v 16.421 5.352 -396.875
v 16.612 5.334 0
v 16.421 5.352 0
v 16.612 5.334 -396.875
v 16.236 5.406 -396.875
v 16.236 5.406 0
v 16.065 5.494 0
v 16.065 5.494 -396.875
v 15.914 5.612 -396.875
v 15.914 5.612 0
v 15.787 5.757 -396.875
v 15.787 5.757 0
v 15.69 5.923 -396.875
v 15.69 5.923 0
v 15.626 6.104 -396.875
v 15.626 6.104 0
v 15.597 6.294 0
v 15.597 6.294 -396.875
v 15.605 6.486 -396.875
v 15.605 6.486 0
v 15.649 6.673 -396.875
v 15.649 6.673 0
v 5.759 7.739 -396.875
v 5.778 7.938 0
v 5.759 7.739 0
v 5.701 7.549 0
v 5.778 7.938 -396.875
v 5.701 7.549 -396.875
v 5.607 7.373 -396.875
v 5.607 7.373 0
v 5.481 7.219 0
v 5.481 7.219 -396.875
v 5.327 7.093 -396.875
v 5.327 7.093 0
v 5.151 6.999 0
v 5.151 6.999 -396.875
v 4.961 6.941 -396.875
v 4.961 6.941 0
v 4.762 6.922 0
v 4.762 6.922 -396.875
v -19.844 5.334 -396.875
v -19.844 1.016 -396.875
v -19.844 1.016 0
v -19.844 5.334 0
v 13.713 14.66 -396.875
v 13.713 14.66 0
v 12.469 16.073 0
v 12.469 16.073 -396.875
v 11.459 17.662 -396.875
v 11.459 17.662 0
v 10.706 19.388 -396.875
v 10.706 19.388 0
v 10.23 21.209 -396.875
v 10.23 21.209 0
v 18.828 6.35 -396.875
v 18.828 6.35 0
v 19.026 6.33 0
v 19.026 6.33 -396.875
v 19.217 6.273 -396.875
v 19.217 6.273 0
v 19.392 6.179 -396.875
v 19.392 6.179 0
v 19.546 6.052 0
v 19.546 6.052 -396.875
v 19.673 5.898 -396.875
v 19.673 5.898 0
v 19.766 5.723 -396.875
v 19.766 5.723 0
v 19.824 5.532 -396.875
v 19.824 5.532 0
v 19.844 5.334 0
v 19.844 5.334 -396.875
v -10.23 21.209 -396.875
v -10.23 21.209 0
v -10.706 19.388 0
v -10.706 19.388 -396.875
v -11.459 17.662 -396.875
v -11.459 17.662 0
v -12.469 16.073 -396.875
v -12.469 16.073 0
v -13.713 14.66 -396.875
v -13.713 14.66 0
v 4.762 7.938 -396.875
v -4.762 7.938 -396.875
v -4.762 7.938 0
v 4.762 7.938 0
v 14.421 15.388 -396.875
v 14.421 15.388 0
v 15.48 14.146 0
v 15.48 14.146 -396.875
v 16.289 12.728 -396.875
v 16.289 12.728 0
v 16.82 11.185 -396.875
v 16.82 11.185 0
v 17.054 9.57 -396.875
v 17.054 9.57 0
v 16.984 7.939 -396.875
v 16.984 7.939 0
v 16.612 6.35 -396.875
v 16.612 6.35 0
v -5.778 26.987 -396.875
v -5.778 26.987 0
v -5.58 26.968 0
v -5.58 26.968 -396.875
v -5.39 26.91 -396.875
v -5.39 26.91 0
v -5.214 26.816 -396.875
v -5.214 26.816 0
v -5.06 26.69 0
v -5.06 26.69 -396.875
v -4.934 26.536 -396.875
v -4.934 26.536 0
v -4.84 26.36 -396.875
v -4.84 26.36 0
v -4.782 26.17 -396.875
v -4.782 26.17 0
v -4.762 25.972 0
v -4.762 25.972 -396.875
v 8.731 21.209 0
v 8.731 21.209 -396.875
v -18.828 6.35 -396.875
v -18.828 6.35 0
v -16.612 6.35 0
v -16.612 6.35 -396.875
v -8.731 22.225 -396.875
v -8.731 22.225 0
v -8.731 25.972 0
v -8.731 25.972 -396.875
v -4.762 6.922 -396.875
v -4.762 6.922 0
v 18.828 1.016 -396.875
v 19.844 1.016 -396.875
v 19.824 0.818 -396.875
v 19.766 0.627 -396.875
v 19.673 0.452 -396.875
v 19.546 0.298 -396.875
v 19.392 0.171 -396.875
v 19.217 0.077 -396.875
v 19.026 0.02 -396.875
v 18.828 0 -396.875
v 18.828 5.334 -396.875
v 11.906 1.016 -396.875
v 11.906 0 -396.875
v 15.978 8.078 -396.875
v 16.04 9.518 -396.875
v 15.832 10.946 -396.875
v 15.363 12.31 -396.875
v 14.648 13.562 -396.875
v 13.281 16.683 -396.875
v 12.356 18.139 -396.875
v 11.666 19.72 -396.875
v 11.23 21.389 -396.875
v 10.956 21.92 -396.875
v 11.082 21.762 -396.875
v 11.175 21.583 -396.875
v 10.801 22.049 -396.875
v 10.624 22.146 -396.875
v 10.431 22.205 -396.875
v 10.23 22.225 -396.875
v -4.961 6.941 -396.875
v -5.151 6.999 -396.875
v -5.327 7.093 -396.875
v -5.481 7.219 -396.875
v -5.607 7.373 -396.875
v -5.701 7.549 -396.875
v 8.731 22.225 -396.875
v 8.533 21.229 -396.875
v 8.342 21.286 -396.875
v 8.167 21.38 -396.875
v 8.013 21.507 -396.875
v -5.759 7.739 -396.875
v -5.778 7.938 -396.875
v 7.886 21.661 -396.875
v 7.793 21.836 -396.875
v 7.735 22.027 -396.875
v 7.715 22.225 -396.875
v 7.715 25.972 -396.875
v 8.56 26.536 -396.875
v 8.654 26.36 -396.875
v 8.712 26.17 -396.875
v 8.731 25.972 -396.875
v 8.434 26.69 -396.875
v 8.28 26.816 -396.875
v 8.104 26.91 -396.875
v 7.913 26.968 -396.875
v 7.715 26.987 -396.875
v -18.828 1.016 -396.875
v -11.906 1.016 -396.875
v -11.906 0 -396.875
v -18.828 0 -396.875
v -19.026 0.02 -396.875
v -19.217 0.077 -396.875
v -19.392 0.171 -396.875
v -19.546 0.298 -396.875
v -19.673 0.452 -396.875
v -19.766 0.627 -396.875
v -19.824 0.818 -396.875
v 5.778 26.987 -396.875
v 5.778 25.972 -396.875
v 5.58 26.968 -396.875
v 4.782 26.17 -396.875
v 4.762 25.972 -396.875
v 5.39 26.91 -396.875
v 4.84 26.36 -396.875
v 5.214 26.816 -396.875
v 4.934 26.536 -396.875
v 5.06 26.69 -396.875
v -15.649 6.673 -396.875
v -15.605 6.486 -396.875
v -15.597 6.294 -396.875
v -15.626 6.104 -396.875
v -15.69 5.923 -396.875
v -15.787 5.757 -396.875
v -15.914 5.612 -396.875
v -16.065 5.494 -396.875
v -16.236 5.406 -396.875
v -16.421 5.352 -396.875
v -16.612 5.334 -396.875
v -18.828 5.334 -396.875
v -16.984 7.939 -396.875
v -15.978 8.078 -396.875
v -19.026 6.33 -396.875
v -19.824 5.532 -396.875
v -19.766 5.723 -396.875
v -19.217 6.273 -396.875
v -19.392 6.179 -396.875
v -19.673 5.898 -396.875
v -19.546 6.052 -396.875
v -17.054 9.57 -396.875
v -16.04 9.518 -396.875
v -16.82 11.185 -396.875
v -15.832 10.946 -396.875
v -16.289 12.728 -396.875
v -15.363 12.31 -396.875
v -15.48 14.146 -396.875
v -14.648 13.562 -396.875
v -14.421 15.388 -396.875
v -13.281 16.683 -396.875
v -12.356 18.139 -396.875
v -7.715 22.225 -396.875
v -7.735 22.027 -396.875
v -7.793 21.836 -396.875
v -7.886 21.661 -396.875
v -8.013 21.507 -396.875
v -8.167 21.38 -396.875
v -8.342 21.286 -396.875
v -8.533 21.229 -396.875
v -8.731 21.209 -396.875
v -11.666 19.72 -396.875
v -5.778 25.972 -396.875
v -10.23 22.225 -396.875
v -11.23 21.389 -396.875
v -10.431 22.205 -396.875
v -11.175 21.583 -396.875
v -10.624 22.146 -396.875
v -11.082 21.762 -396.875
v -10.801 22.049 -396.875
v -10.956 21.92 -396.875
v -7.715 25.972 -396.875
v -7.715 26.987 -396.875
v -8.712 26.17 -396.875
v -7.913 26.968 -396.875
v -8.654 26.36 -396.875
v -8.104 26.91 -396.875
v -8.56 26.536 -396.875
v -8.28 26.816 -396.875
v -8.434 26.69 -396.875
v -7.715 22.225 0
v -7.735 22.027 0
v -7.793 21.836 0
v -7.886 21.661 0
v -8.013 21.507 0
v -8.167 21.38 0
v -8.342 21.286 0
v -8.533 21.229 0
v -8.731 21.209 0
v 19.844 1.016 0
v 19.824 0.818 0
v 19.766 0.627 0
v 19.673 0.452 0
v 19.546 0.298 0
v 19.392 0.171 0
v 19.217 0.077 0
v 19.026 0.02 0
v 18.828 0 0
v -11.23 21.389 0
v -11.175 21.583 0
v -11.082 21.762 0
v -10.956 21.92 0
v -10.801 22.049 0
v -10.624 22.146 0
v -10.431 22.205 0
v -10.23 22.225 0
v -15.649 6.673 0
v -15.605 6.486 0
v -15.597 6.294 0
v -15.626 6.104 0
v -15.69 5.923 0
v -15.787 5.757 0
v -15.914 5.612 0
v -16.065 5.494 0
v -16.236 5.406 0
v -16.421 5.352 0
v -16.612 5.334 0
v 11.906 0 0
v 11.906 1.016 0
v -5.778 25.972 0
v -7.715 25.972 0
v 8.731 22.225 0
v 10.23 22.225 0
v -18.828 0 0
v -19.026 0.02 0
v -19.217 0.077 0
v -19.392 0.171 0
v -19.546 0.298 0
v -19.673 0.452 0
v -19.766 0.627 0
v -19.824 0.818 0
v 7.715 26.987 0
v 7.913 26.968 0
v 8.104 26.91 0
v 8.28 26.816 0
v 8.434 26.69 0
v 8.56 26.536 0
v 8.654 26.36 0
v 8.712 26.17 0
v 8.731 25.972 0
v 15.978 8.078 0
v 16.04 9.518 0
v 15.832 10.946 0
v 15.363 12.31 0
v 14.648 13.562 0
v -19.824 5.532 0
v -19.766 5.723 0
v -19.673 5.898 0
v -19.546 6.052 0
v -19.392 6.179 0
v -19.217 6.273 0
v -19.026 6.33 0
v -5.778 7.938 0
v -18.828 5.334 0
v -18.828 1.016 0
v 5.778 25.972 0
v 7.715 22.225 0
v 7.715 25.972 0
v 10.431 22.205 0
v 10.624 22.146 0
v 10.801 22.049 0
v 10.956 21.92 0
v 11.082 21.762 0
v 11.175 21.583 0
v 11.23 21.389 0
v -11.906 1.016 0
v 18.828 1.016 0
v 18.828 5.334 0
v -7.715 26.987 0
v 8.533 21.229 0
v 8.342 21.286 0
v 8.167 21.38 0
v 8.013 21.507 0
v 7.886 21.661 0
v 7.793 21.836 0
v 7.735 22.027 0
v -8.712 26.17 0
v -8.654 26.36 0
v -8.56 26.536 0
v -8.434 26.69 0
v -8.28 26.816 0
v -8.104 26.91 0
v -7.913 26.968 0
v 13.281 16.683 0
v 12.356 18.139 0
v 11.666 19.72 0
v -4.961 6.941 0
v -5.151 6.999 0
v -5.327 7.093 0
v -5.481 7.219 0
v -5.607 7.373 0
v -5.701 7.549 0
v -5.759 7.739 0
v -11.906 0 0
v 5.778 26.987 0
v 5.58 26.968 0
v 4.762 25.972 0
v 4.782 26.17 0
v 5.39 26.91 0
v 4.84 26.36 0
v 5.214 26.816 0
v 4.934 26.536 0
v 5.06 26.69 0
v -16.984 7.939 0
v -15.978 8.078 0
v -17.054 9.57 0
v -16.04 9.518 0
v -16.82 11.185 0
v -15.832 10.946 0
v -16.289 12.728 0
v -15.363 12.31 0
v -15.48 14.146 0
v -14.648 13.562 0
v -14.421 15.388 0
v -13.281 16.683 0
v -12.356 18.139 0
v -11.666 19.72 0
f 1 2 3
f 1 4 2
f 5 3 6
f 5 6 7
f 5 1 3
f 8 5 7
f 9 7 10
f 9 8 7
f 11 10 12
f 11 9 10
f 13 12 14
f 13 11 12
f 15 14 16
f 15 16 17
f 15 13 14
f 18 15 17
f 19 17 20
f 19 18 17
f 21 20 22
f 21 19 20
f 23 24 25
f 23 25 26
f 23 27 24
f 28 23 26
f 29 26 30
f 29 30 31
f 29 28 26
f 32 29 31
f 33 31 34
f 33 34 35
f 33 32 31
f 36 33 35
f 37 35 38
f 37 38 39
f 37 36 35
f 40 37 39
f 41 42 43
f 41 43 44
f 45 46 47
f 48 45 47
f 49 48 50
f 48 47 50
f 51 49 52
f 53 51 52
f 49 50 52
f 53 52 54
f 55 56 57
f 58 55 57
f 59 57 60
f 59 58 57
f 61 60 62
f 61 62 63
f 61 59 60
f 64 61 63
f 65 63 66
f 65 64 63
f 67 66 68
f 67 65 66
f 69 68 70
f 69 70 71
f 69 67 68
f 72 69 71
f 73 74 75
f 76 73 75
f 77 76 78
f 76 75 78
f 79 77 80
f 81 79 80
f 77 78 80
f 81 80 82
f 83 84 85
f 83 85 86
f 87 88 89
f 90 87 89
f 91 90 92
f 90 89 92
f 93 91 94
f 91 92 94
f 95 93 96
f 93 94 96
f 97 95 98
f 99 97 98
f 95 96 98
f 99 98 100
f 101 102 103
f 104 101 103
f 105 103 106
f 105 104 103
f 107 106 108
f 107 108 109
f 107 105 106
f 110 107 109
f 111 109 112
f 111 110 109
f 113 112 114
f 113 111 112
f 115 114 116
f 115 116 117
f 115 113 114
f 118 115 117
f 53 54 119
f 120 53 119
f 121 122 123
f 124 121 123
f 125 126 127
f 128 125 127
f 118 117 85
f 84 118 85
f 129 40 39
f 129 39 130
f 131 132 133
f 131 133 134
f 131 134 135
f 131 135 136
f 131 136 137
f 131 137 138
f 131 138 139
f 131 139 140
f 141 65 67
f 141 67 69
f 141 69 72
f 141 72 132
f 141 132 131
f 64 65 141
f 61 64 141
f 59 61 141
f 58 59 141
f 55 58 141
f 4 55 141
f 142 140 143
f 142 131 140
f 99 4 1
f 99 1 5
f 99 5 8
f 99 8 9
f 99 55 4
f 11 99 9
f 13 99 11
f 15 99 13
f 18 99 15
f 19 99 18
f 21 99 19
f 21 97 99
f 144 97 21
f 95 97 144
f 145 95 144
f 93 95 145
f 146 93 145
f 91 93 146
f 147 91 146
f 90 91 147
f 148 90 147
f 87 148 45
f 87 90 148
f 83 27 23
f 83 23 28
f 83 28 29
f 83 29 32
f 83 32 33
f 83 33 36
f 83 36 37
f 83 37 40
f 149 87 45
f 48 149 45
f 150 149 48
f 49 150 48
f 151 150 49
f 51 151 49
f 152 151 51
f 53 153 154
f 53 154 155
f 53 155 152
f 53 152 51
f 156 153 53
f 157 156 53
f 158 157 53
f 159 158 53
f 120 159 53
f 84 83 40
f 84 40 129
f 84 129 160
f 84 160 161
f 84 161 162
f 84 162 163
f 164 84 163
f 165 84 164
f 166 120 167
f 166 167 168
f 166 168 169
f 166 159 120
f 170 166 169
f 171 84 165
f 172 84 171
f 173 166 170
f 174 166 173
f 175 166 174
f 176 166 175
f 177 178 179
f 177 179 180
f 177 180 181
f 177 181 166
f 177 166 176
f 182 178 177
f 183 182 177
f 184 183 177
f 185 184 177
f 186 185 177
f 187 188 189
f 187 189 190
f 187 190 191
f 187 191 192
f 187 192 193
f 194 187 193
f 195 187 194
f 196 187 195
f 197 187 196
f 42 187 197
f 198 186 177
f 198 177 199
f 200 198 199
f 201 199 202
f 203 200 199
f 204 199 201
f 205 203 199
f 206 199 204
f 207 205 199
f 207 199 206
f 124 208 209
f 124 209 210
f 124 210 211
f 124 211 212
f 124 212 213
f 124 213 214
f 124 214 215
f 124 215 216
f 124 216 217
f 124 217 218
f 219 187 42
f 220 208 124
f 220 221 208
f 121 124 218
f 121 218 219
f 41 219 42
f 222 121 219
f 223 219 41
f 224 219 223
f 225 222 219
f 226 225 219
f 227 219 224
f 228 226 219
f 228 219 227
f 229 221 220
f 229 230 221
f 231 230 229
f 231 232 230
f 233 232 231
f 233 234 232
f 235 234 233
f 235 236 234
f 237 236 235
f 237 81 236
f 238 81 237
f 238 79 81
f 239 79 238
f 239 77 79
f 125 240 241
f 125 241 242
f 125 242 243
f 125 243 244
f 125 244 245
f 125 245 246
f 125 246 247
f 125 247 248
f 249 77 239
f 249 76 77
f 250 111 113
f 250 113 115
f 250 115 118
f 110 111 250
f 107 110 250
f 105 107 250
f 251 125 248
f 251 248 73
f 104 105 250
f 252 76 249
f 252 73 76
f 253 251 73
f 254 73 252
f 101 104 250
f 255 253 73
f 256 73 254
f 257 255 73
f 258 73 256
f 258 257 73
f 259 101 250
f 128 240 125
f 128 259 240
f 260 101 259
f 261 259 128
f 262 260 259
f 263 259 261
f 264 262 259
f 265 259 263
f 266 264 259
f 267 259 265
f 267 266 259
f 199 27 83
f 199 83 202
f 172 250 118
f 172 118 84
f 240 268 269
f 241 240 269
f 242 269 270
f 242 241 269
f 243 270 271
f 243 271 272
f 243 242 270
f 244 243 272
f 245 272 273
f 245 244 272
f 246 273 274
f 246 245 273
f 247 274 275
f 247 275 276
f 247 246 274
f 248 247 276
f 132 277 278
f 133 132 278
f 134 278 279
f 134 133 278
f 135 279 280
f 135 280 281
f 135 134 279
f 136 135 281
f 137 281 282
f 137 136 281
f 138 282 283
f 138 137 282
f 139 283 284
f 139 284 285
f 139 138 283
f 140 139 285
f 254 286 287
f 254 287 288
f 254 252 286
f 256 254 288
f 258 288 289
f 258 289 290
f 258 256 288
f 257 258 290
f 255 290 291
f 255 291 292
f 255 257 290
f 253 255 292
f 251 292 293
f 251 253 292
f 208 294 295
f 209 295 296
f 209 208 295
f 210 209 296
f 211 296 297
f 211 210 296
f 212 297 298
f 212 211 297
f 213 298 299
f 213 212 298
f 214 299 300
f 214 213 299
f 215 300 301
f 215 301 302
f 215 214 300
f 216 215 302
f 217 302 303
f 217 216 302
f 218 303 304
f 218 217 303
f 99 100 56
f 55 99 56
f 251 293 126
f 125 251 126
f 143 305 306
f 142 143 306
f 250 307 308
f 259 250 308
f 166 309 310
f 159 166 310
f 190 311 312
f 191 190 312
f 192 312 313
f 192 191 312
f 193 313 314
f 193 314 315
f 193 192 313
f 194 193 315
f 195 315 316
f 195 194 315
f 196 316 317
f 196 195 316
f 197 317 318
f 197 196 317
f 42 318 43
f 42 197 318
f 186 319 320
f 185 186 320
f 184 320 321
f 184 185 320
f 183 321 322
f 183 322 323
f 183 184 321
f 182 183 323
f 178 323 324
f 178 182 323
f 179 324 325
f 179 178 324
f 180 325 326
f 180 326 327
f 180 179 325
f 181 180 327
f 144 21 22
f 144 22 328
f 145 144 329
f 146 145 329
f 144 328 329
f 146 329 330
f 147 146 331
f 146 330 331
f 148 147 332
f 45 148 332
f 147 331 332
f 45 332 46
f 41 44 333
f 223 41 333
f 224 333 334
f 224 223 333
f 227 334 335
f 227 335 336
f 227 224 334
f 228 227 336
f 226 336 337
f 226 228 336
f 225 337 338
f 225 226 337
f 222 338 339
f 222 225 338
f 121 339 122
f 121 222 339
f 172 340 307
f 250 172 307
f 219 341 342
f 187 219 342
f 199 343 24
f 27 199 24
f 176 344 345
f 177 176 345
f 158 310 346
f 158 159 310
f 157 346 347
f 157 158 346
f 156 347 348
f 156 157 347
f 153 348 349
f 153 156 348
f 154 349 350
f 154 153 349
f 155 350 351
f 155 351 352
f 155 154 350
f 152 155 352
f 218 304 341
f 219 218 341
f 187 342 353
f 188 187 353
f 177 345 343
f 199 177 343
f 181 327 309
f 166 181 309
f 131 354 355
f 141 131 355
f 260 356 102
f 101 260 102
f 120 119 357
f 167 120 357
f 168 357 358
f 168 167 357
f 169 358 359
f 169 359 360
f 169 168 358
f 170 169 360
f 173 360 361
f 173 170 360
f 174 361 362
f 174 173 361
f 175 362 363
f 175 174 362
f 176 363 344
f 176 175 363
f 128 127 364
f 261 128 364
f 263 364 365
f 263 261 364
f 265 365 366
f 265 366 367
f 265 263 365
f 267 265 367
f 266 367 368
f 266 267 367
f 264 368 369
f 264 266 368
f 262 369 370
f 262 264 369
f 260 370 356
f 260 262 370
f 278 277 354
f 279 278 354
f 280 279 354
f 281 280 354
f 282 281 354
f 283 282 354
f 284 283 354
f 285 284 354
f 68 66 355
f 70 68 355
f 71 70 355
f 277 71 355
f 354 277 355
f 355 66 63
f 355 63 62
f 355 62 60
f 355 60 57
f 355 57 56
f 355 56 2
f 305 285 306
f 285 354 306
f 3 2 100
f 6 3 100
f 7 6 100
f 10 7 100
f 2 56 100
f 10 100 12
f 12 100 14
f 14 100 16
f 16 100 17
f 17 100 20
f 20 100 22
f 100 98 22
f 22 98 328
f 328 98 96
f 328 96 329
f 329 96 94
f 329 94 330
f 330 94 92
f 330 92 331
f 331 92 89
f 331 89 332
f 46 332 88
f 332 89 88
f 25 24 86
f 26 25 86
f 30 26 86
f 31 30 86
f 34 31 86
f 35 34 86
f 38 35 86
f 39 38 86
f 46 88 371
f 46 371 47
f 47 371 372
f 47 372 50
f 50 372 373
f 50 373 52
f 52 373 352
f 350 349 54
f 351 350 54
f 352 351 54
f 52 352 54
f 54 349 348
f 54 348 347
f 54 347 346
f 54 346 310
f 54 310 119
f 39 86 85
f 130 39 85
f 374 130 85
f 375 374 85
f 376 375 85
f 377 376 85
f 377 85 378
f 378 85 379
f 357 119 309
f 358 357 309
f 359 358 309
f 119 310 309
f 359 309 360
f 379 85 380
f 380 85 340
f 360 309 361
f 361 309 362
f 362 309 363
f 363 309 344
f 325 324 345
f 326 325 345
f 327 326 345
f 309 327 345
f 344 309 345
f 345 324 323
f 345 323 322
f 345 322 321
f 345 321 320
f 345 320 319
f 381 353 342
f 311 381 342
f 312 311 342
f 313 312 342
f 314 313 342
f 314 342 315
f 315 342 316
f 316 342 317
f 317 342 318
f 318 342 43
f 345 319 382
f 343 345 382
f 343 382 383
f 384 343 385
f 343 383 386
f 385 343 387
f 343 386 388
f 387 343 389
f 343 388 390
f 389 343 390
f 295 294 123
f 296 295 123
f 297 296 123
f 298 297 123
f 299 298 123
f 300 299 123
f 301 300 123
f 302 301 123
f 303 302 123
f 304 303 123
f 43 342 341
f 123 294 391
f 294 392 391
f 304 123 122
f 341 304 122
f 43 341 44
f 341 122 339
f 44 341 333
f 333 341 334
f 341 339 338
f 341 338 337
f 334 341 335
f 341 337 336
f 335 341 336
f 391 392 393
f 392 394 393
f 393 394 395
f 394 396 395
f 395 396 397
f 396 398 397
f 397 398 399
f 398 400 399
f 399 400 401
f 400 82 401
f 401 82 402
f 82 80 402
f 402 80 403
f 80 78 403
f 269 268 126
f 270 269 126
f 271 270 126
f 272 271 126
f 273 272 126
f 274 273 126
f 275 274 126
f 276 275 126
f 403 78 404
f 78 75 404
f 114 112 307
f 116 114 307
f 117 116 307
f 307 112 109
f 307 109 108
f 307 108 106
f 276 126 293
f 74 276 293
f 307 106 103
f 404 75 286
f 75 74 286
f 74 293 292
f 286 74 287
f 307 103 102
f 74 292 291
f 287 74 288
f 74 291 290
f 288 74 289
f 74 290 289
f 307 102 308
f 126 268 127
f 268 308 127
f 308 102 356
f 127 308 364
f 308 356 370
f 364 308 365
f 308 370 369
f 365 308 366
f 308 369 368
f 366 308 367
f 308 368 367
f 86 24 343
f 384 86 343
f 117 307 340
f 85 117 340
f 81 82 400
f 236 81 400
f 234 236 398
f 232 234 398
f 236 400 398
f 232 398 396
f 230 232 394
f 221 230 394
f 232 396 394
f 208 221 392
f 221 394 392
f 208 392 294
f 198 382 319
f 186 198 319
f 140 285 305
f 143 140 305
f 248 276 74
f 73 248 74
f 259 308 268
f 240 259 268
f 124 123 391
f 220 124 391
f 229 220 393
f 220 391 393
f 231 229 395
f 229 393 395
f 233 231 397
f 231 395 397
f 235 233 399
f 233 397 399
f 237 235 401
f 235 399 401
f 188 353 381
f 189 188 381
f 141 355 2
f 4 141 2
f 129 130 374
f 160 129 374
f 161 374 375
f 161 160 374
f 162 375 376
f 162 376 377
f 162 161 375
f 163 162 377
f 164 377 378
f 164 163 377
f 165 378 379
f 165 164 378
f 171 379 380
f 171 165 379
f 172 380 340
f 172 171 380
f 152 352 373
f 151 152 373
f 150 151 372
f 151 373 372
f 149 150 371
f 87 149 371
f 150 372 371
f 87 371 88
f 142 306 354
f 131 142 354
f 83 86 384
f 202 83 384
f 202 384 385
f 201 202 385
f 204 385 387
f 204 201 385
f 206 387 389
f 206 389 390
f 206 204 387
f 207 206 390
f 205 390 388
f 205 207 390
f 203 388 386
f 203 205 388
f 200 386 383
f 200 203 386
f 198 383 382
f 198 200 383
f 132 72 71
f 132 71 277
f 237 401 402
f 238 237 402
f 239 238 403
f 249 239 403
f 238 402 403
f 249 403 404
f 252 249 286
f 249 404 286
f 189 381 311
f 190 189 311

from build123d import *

# Parameters (mm, degrees)
EXTRUDE_THIN1_DEPTH = 396.875
FILLET1_R           = 1.016


with BuildPart() as part:
    # Sketch1 → Extrude-Thin1 (new body)
    with BuildSketch(Plane.XY):
        with BuildLine():
            Line((-11.90625, 0), (-19.84375, 0))
            Line((-19.84375, 0), (-19.84375, 6.35))
            Line((-19.84375, 6.35), (-16.611859403, 6.35))
            ThreePointArc((-16.611859403, 6.35), (-16.819864191, 11.185113028), (-14.420873366, 15.388257922))
            ThreePointArc((-14.420873366, 15.388257922), (-12.164462393, 18.51520612), (-11.1125, 22.225))
            Line((-11.1125, 22.225), (-8.73125, 22.225))
            Line((-8.73125, 22.225), (-8.73125, 26.9875))
            Line((-8.73125, 26.9875), (-4.7625, 26.9875))
            Line((-4.7625, 26.9875), (-4.7625, 7.9375))
            Line((-4.7625, 7.9375), (4.7625, 7.9375))
            Line((4.7625, 7.9375), (4.7625, 26.9875))
            Line((4.7625, 26.9875), (8.73125, 26.9875))
            Line((8.73125, 26.9875), (8.73125, 22.225))
            Line((8.73125, 22.225), (11.1125, 22.225))
            ThreePointArc((11.1125, 22.225), (12.164462393, 18.51520612), (14.420873366, 15.388257922))
            ThreePointArc((14.420873366, 15.388257922), (16.819864191, 11.185113028), (16.611859403, 6.35))
            Line((16.611859403, 6.35), (19.84375, 6.35))
            Line((19.84375, 6.35), (19.84375, 0))
            Line((19.84375, 0), (11.90625, 0))
            Line((11.90625, 0), (11.90625, 1.016))
            Line((11.90625, 1.016), (18.82775, 1.016))
            Line((18.82775, 1.016), (18.82775, 5.334))
            Line((18.82775, 5.334), (15.052239099, 5.334))
            ThreePointArc((15.052239099, 5.334), (15.971237356, 10.225128152), (13.712626283, 14.659806091))
            ThreePointArc((13.712626283, 14.659806091), (11.458524166, 17.661660911), (10.230316486, 21.209))
            Line((10.230316486, 21.209), (7.71525, 21.209))
            Line((7.71525, 21.209), (7.71525, 25.9715))
            Line((7.71525, 25.9715), (5.7785, 25.9715))
            Line((5.7785, 25.9715), (5.7785, 6.9215))
            Line((5.7785, 6.9215), (-5.7785, 6.9215))
            Line((-5.7785, 6.9215), (-5.7785, 25.9715))
            Line((-5.7785, 25.9715), (-7.71525, 25.9715))
            Line((-7.71525, 25.9715), (-7.71525, 21.209))
            Line((-7.71525, 21.209), (-10.230316486, 21.209))
            ThreePointArc((-10.230316486, 21.209), (-11.458524166, 17.661660911), (-13.712626283, 14.659806091))
            ThreePointArc((-13.712626283, 14.659806091), (-15.971237356, 10.225128152), (-15.052239099, 5.334))
            Line((-15.052239099, 5.334), (-18.82775, 5.334))
            Line((-18.82775, 5.334), (-18.82775, 1.016))
            Line((-18.82775, 1.016), (-11.90625, 1.016))
            Line((-11.90625, 1.016), (-11.90625, 0))
        make_face()
    extrude(amount=-EXTRUDE_THIN1_DEPTH)

    # Fillet1
    fillet1_edges = [part.edges().sort_by_distance(p)[0] for p in [
        (-19.84375, 0, -198.4375),
        (-19.84375, 6.35, -198.4375),
        (-11.1125, 22.225, -198.4375),
        (-8.73125, 26.9875, -198.4375),
        (-4.7625, 26.9875, -198.4375),
        (4.7625, 26.9875, -198.4375),
        (8.73125, 26.9875, -198.4375),
        (11.1125, 22.225, -198.4375),
        (19.84375, 6.35, -198.4375),
        (19.84375, 0, -198.4375),
        (15.052239099, 5.334, -198.4375),
        (7.71525, 21.209, -198.4375),
        (5.7785, 6.9215, -198.4375),
        (-5.7785, 6.9215, -198.4375),
        (-7.71525, 21.209, -198.4375),
        (-15.052239099, 5.334, -198.4375),
    ]]
    fillet(fillet1_edges, radius=FILLET1_R)


solid = part.part
